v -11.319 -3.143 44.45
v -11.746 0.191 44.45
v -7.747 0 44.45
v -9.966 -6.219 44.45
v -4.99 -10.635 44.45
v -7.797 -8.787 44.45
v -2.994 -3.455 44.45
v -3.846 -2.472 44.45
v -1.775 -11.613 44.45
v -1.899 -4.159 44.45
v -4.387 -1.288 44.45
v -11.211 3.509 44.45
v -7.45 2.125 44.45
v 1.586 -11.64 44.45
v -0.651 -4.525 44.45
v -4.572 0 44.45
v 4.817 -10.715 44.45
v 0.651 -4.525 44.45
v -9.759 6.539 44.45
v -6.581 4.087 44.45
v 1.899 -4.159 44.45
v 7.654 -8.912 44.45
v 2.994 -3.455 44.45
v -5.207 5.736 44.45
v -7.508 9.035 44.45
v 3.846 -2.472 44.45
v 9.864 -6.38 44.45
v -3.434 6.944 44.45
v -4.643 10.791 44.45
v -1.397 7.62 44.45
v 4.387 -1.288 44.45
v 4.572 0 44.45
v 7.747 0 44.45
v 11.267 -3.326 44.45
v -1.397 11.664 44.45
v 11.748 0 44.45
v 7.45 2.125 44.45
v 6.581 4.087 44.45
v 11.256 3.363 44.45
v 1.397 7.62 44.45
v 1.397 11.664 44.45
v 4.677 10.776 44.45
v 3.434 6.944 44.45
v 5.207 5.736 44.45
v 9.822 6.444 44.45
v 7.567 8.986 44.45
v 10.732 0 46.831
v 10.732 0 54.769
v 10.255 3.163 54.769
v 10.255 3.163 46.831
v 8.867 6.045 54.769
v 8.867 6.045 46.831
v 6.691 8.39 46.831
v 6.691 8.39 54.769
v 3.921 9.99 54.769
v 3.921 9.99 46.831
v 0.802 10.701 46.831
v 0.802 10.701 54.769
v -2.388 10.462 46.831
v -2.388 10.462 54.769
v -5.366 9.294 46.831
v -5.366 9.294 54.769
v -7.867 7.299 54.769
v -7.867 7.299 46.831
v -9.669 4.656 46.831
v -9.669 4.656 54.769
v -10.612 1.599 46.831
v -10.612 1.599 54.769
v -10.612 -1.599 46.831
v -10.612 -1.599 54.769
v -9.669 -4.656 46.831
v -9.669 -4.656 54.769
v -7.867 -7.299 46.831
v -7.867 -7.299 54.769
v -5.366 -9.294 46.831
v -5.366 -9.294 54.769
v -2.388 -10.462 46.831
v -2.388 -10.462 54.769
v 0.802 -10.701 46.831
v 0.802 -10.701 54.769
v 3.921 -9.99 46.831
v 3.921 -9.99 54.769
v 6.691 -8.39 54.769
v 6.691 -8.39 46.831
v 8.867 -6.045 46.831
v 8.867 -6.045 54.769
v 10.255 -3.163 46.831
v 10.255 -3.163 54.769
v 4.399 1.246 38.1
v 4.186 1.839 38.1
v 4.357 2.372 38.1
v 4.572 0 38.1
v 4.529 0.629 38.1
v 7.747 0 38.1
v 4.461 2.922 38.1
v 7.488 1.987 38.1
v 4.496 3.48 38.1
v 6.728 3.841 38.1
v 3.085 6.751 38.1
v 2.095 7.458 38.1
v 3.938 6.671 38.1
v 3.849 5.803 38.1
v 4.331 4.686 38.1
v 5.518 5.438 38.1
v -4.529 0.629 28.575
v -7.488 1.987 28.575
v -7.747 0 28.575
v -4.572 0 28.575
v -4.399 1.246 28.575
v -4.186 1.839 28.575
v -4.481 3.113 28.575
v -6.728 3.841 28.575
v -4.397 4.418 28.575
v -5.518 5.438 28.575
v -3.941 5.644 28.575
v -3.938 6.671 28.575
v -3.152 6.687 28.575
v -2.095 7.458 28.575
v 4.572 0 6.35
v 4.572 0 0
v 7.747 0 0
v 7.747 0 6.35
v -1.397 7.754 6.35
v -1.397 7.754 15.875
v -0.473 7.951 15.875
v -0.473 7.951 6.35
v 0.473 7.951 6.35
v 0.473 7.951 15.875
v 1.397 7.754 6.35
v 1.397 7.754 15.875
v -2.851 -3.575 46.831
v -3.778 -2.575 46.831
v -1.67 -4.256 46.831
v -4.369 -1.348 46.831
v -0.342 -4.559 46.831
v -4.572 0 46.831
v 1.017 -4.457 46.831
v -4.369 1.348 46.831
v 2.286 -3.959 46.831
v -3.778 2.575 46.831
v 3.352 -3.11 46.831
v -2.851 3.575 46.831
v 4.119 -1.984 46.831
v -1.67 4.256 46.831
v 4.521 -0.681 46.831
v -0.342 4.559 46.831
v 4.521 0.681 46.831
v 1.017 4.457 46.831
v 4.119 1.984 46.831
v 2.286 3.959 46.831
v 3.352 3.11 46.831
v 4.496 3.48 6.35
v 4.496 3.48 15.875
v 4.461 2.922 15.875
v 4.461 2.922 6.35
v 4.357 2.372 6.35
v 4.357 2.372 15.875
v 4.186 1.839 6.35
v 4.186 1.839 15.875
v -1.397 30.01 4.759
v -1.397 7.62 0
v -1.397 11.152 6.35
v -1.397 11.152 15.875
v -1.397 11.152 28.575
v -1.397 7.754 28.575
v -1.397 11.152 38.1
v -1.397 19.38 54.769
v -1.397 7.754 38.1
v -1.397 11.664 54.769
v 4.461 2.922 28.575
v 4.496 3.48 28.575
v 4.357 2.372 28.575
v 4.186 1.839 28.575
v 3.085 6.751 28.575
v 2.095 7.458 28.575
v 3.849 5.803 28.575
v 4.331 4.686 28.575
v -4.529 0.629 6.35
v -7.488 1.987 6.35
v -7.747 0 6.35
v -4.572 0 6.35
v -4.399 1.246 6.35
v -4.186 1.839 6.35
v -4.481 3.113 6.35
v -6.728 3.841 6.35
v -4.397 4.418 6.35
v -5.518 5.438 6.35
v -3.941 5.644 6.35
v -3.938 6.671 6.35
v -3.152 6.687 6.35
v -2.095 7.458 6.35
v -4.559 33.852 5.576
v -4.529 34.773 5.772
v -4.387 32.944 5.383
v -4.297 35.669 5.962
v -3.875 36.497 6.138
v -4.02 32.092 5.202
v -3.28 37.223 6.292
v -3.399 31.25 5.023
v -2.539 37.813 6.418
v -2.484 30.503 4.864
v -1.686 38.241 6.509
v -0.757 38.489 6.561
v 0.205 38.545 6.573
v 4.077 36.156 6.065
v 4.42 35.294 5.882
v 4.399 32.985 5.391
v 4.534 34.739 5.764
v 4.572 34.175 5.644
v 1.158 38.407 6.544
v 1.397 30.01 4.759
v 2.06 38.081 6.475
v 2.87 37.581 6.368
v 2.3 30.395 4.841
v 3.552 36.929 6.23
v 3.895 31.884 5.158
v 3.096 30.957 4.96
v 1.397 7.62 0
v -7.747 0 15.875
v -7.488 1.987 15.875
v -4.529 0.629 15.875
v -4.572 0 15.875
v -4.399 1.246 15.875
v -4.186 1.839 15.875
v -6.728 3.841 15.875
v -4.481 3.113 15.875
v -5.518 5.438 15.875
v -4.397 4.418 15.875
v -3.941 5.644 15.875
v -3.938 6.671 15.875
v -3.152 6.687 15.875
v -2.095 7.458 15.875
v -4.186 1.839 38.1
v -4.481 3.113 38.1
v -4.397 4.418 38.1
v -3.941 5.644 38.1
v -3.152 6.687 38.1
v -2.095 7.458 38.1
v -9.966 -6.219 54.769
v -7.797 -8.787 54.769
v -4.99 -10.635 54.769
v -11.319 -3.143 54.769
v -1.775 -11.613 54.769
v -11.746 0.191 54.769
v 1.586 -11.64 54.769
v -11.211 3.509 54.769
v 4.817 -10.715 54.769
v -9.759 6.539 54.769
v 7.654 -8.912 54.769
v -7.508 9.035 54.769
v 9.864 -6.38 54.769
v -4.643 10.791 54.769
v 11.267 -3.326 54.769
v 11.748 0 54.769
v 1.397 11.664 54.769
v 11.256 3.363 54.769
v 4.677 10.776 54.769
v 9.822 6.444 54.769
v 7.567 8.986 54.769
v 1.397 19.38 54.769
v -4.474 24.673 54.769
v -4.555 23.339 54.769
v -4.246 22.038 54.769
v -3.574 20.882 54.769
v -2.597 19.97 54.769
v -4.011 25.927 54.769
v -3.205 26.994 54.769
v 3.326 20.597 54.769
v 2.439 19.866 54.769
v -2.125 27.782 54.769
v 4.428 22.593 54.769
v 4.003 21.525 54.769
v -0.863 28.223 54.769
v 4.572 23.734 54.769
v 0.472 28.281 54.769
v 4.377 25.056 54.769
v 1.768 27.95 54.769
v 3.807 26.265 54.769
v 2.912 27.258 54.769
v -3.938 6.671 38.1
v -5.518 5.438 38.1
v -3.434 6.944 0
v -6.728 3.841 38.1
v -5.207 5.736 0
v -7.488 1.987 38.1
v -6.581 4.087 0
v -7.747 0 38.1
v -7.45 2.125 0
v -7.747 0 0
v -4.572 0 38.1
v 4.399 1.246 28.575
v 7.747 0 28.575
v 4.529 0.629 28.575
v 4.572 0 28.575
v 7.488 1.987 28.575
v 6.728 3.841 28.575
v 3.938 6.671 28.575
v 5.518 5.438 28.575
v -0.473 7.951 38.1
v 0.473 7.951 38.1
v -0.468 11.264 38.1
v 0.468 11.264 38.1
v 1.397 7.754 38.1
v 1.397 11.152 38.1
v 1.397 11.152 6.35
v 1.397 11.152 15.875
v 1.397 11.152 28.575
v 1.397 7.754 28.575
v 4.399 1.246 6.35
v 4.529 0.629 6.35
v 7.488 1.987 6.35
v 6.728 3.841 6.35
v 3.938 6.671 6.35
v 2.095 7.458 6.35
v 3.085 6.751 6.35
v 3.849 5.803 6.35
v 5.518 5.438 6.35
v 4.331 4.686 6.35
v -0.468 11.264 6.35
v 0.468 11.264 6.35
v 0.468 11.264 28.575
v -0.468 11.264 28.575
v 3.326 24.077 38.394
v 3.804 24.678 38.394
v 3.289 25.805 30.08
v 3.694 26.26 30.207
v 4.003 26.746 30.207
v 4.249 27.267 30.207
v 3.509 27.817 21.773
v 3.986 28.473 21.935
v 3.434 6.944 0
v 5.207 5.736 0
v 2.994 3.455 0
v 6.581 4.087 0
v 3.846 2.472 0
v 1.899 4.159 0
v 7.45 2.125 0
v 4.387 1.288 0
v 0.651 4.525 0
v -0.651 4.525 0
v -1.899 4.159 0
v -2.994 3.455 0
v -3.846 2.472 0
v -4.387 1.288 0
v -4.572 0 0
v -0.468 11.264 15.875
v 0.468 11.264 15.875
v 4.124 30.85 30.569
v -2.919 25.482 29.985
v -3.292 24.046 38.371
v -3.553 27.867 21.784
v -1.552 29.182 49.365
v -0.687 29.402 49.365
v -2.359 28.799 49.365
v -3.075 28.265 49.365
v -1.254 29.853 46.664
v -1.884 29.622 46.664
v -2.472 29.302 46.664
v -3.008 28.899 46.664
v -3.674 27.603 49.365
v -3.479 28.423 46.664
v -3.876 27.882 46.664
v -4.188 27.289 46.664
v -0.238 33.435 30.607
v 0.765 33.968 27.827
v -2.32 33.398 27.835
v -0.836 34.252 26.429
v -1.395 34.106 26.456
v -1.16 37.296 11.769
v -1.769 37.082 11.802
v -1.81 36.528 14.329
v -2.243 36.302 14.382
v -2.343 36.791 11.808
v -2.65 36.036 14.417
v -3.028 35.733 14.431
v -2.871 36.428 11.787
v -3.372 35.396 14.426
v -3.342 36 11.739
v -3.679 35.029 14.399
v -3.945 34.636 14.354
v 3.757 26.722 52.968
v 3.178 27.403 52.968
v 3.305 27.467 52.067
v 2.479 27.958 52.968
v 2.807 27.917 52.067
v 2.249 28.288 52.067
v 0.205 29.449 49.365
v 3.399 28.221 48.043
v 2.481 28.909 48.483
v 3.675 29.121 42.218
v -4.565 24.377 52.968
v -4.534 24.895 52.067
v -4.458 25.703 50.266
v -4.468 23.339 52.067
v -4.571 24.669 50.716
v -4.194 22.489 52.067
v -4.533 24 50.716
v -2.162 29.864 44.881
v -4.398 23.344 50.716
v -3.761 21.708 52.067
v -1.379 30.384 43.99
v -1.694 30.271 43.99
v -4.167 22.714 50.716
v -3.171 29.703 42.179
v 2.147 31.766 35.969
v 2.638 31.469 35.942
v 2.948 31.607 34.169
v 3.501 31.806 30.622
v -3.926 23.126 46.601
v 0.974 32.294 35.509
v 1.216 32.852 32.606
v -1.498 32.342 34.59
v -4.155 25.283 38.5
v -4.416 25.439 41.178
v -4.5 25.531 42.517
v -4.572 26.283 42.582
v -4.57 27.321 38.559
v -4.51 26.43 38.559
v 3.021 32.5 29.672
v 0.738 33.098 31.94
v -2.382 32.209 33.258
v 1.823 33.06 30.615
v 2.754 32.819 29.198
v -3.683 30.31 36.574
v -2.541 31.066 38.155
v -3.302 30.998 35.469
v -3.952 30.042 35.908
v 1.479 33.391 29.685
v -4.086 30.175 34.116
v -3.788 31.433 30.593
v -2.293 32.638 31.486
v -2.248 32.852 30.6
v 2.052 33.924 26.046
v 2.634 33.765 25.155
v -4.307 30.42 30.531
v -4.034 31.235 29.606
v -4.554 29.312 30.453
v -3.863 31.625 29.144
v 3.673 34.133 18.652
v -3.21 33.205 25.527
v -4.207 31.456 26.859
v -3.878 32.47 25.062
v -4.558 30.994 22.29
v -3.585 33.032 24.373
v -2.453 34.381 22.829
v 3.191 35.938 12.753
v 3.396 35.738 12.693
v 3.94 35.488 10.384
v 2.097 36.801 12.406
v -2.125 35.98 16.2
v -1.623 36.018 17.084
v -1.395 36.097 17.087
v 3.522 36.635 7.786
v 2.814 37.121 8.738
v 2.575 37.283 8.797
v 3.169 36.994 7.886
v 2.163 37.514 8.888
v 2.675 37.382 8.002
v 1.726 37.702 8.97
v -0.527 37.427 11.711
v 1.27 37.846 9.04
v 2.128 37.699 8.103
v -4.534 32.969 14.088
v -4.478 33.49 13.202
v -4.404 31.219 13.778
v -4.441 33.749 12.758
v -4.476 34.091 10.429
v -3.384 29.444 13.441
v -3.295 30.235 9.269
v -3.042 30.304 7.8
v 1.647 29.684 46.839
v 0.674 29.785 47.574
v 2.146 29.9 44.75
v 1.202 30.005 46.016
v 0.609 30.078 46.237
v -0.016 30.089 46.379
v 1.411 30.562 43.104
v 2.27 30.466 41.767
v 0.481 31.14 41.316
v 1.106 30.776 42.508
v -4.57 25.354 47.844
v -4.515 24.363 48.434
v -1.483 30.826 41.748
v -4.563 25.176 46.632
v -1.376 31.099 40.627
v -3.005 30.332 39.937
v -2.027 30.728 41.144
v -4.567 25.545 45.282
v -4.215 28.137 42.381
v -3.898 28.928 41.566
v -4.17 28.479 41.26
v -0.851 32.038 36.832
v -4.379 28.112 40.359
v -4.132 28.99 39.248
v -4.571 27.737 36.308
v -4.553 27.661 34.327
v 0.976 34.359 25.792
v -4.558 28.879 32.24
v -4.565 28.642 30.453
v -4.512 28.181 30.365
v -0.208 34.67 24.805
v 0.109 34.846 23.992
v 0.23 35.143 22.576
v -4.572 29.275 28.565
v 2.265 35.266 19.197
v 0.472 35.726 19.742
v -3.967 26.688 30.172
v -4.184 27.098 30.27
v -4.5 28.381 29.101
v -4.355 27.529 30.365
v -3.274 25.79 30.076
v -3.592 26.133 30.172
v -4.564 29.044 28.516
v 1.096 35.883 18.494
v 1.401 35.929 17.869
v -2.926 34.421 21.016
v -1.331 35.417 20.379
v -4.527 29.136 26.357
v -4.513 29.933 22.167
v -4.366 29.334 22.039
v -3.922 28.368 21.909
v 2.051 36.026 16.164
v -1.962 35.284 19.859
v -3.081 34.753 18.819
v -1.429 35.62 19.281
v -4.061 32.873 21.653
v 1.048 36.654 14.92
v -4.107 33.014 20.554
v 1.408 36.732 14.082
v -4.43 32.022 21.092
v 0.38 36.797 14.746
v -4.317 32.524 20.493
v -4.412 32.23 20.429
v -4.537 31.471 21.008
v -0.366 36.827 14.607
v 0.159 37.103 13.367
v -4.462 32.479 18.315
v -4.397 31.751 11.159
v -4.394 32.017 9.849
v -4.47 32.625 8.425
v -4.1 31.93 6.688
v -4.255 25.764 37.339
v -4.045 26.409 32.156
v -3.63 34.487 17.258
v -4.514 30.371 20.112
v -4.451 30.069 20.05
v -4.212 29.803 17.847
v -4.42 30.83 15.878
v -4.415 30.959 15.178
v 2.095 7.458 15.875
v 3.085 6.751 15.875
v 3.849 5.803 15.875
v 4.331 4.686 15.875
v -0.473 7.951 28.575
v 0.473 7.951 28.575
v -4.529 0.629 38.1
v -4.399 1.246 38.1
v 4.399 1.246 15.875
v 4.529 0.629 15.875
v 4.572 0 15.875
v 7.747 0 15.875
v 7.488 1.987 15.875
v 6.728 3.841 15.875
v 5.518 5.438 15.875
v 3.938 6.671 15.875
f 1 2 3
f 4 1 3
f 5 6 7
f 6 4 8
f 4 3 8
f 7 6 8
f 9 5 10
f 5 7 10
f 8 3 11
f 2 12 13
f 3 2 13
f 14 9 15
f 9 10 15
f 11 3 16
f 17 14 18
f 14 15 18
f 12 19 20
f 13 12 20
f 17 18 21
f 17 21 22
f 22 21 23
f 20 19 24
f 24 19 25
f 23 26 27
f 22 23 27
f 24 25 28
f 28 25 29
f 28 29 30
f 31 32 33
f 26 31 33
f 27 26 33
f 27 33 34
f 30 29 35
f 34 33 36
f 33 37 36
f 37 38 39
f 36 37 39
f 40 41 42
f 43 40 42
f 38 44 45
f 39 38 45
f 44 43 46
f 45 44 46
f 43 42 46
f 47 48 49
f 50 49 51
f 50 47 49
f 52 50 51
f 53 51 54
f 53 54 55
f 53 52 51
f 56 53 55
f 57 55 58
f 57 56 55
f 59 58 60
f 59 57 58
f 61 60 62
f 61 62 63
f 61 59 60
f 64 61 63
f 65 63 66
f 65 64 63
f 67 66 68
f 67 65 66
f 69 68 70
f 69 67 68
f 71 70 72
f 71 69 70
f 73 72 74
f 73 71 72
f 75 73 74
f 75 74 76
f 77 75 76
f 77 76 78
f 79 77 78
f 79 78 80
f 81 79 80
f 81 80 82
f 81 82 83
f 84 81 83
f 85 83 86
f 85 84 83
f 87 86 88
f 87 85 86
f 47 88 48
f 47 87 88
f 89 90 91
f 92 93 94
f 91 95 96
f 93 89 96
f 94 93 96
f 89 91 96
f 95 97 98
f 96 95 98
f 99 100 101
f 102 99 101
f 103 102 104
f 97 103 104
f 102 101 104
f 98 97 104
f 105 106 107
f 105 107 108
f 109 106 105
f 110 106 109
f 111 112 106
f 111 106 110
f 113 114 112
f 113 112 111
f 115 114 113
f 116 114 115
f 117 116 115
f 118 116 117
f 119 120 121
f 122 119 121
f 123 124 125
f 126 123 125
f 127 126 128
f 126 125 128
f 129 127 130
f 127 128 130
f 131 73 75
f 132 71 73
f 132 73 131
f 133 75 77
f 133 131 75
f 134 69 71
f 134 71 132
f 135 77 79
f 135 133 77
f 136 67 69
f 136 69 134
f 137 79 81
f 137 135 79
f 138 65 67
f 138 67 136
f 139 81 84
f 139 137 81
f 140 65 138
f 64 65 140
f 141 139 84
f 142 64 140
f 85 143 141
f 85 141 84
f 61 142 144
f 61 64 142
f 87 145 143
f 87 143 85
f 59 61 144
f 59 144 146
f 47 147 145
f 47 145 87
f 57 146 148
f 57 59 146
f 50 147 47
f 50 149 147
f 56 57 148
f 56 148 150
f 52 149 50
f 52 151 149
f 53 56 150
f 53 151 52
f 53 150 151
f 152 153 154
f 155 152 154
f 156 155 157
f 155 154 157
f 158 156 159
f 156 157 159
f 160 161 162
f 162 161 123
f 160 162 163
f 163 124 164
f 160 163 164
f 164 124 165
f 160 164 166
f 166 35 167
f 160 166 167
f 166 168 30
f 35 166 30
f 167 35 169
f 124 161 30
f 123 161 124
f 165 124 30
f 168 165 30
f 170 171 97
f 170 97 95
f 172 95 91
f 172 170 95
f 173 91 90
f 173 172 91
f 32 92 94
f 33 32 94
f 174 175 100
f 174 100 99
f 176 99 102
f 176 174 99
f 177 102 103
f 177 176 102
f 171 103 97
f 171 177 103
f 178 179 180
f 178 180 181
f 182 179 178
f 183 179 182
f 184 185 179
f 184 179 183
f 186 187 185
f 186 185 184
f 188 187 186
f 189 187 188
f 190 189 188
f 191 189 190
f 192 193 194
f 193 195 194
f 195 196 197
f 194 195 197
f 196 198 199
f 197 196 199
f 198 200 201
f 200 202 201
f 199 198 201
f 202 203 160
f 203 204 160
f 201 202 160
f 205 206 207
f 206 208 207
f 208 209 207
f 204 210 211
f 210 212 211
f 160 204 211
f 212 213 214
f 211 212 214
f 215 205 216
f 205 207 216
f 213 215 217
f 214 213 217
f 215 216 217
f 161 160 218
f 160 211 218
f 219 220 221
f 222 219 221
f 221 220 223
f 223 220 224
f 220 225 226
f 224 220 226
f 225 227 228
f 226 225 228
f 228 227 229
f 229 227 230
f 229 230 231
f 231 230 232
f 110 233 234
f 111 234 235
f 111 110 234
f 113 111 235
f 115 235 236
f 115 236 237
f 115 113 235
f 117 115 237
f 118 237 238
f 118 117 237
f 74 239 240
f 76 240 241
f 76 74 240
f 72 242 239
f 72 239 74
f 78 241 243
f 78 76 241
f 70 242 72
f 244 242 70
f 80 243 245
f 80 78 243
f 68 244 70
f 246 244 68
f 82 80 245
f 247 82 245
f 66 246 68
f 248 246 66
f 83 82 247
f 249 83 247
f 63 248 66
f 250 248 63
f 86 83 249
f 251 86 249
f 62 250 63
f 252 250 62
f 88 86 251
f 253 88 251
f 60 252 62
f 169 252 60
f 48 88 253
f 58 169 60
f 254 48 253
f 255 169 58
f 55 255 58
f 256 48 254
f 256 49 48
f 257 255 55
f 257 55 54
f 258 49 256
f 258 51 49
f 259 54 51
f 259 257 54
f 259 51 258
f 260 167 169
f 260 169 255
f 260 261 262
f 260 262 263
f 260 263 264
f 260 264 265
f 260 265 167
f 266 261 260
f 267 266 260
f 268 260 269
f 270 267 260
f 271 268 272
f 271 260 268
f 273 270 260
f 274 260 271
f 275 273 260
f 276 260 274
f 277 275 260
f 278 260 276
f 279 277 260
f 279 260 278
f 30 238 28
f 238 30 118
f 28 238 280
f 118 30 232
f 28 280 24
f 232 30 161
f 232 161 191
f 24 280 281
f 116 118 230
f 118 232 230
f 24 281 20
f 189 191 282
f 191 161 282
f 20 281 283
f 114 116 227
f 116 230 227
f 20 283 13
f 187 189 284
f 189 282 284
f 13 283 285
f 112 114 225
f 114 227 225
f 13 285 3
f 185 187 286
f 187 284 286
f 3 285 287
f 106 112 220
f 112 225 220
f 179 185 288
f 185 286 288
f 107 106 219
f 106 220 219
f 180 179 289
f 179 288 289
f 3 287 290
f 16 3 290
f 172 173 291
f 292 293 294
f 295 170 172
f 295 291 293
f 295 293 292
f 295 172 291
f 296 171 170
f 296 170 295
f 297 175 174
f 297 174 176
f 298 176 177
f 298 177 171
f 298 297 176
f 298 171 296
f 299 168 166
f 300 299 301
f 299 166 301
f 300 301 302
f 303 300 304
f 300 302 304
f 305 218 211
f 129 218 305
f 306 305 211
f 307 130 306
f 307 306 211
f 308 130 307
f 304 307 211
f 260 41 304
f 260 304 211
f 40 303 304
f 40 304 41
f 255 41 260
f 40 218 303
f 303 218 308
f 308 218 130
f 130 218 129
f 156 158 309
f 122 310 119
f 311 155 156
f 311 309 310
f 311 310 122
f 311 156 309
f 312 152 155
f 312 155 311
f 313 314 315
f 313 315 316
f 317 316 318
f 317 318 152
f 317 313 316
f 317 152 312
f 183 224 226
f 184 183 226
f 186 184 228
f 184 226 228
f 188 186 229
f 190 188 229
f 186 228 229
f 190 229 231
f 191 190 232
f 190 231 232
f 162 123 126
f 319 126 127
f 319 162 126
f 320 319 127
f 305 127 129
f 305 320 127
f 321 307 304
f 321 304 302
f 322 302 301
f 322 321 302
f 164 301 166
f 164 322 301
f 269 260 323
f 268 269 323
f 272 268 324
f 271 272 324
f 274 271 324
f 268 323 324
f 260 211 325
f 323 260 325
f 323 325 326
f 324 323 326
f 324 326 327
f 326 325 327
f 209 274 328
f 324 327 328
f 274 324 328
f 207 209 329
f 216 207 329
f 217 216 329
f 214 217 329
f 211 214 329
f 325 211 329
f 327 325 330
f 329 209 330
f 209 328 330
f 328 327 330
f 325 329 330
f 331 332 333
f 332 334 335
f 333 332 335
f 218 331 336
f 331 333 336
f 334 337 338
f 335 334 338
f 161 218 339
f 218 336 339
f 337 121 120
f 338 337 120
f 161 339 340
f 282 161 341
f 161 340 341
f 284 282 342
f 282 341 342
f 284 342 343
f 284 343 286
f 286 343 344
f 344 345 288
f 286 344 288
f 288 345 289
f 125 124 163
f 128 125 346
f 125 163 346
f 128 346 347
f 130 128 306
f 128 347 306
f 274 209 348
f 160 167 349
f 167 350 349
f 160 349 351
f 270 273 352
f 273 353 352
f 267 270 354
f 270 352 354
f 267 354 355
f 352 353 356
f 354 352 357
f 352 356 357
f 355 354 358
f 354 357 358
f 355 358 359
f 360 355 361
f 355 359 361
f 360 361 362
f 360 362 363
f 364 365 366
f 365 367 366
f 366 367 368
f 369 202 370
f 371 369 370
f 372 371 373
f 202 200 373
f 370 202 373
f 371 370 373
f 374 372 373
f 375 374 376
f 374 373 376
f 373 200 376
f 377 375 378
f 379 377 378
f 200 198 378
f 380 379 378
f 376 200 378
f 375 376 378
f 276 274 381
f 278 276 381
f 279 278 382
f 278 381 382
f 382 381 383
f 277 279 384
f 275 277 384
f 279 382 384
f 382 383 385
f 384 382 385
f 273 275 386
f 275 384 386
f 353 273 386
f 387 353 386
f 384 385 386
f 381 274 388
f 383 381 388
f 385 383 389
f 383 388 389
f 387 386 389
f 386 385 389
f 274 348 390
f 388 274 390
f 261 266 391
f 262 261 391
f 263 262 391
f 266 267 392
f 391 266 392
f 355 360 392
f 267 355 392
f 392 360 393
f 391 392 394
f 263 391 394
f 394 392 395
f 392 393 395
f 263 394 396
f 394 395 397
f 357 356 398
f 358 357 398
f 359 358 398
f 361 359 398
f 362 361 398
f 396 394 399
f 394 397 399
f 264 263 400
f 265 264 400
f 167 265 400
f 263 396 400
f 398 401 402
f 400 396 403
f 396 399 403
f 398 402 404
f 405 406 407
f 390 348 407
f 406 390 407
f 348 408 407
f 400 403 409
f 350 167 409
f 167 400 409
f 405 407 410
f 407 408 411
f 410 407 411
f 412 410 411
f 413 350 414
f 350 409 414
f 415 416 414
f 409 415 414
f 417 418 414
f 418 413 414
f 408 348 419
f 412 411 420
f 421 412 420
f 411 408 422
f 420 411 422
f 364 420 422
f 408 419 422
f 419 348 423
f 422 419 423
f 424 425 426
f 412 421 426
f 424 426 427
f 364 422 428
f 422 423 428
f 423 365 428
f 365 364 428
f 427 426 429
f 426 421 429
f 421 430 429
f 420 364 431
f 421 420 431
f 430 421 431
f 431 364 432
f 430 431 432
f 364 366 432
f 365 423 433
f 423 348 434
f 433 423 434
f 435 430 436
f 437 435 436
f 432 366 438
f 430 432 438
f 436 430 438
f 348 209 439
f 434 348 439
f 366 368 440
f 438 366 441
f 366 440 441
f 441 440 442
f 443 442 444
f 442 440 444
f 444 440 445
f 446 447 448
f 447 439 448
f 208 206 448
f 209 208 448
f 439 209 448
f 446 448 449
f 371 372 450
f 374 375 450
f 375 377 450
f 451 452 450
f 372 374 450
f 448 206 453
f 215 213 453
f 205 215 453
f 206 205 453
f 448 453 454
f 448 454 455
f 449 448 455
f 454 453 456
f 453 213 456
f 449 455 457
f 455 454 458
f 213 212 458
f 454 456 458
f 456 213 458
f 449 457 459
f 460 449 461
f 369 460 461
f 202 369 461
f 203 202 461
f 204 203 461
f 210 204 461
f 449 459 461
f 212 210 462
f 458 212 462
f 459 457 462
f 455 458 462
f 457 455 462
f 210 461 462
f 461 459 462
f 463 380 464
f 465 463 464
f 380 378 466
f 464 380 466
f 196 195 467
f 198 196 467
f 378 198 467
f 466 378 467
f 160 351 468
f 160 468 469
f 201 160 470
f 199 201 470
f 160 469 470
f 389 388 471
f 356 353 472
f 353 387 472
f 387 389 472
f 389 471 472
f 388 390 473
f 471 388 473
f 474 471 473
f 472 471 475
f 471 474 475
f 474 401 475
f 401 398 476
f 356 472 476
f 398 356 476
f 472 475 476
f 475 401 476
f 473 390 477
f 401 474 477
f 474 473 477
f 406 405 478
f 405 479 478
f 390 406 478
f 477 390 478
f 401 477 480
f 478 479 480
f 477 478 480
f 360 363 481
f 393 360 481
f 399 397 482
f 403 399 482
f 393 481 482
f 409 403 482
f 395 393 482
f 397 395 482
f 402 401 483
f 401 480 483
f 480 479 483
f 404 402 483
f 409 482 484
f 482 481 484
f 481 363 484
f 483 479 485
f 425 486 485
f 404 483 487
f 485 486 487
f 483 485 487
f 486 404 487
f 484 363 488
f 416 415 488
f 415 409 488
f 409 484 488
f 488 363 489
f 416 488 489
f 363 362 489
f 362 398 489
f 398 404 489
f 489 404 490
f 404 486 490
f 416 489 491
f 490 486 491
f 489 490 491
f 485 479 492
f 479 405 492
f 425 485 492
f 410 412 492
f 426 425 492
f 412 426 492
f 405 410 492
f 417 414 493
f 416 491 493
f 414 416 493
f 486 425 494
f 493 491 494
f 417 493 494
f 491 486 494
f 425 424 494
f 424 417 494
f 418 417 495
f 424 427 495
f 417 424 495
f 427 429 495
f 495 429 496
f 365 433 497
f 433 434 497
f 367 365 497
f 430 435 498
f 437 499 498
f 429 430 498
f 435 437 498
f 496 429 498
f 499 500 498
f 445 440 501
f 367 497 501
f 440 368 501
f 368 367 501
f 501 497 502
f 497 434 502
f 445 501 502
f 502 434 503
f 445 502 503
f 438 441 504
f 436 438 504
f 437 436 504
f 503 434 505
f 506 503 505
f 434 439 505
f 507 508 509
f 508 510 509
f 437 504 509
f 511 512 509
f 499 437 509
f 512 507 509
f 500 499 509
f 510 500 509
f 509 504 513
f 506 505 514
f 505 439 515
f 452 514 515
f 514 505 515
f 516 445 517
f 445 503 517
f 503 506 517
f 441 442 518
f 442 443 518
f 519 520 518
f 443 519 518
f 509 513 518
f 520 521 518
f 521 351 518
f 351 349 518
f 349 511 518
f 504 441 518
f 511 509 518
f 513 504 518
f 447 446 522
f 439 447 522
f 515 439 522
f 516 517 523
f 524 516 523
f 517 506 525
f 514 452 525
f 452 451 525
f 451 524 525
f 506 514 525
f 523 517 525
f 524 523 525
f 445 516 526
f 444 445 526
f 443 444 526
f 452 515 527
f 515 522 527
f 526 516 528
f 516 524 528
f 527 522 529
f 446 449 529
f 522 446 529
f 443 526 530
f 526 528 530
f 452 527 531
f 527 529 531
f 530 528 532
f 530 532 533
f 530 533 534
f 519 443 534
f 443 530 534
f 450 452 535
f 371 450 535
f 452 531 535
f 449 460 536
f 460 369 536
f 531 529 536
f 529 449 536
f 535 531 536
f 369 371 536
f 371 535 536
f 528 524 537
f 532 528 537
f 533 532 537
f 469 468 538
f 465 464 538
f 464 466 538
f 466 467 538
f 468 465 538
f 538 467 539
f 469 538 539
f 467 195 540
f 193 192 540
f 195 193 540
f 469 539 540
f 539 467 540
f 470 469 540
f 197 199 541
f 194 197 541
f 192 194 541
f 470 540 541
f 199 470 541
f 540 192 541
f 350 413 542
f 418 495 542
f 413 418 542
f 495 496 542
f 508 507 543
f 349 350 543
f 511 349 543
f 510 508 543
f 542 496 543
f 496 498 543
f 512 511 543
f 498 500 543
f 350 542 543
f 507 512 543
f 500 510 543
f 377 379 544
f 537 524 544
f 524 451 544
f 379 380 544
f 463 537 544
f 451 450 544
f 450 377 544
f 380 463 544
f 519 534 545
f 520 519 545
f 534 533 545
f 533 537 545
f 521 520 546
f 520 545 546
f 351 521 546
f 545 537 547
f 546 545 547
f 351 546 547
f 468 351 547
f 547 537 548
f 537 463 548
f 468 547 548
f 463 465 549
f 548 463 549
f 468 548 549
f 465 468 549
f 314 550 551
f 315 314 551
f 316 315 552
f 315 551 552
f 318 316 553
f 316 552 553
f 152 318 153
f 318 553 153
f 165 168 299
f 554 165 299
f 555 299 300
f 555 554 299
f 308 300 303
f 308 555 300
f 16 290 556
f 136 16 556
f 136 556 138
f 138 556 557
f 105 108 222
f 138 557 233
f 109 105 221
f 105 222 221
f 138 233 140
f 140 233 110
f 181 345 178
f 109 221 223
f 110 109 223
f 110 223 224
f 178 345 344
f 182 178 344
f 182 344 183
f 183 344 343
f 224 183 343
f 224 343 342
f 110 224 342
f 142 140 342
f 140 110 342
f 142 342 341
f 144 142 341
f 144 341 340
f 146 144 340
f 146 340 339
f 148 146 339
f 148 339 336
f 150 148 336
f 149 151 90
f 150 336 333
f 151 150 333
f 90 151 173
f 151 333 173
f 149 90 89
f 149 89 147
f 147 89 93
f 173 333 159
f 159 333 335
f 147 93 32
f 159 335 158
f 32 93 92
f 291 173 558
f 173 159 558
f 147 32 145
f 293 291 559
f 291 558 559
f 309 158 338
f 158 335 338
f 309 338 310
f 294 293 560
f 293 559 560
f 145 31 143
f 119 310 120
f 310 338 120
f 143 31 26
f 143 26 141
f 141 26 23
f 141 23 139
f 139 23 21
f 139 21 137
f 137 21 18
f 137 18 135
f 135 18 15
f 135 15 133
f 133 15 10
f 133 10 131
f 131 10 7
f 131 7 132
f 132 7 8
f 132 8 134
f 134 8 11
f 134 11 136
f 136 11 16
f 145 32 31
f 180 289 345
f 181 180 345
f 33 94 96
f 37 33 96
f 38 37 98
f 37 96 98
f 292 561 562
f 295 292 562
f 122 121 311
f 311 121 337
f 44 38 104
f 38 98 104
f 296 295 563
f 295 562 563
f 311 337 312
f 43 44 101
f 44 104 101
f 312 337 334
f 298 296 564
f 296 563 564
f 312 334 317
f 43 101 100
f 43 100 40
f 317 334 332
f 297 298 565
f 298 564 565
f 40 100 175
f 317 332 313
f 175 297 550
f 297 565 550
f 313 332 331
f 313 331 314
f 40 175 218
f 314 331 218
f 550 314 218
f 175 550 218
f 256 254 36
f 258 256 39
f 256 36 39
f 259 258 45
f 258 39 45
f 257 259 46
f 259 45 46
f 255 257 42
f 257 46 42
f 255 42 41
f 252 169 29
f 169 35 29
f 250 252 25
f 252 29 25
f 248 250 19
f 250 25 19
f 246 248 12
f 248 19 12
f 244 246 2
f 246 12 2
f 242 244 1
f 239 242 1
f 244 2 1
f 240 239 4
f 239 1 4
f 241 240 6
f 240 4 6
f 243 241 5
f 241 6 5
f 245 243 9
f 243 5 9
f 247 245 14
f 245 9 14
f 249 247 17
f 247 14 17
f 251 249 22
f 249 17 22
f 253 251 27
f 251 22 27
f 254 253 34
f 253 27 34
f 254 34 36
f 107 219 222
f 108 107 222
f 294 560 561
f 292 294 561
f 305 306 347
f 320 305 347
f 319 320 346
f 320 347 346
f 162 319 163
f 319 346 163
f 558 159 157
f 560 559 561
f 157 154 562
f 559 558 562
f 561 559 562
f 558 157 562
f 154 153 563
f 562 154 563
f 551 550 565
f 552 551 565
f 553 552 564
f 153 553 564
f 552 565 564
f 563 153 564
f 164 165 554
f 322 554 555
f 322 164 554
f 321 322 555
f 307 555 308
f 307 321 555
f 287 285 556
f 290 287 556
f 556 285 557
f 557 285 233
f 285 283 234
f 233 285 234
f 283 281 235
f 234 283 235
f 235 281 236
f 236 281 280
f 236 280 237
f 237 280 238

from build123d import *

# Parameters (mm, degrees)
F1_DEPTH    = 44.45
F9_DEPTH    = 9.525
F10_DEPTH   = 9.525
F12_DEPTH   = 2.38125
F13_R       = 11.7475
F13_R_2     = 10.7315
F14_DEPTH   = 7.9375
F15_DEPTH   = 10.31875
F15_FACE1_W = 2.794
F15_FACE1_H = 54.76875
F22_DEPTH   = 12.7


with BuildPart() as f1:
    # F0 (on Top) → F1 (new body)
    with BuildSketch(Plane.XY):
        with BuildLine():
            ThreePointArc((-4.572, 0), (0, 4.572), (4.572, 0))
            Line((4.572, 0), (7.747, 0))
            ThreePointArc((7.747, 0), (5.951410253, 4.9595085442), (1.397, 7.62))
            ThreePointArc((1.397, 7.62), (0, 7.747), (-1.397, 7.62))
            ThreePointArc((-1.397, 7.62), (-5.951410253, 4.9595085442), (-7.747, 0))
            Line((-7.747, 0), (-4.572, 0))
        make_face()
        with BuildLine():
            ThreePointArc((-1.397, 7.62), (0, 7.747), (1.397, 7.62))
            Line((1.397, 7.62), (1.397, 19.3802))
            Line((1.397, 19.3802), (-1.397, 19.3802))
            Line((-1.397, 19.3802), (-1.397, 7.62))
        make_face()
    extrude(amount=F1_DEPTH)

    # F6 (on offset) → F9 (cut)
    with BuildSketch(Plane.XY.offset(28.575)):
        with BuildLine():
            ThreePointArc((4.1557772601, 1.7640375299), (0, -1.016), (-4.1557772601, 1.7640375299))
            Line((-4.1557772601, 1.7640375299), (-7.6070004234, 1.7640375299))
            ThreePointArc((-7.6070004234, 1.7640375299), (0, -4.318), (7.6070004234, 1.7640375299))
            Line((7.6070004234, 1.7640375299), (4.1557772601, 1.7640375299))
        make_face()
        with BuildLine():
            ThreePointArc((-4.1557772601, 1.7640375299), (-0.8747878771, 7.8904367738), (4.4961791045, 3.4801791045))
            ThreePointArc((4.4961791045, 3.4801791045), (4.4102576693, 2.6053912274), (4.1557772601, 1.7640375299))
            Line((4.1557772601, 1.7640375299), (7.6070004234, 1.7640375299))
            ThreePointArc((7.6070004234, 1.7640375299), (7.750237064, 2.6168003938), (7.7981791045, 3.4801791045))
            ThreePointArc((7.7981791045, 3.4801791045), (-0.8633787106, 11.2304161684), (-7.6070004234, 1.7640375299))
            Line((-7.6070004234, 1.7640375299), (-4.1557772601, 1.7640375299))
        make_face()
        with BuildLine():
            ThreePointArc((7.6070004234, 1.7640375299), (0, -4.318), (-7.6070004234, 1.7640375299))
            Line((-7.6070004234, 1.7640375299), (-8.4216929972, 1.7640375299))
            Line((-8.4216929972, 1.7640375299), (-8.4216929972, -6.3198274001))
            Line((-8.4216929972, -6.3198274001), (11.7628639564, -6.3198274001))
            Line((11.7628639564, -6.3198274001), (11.7628639564, 1.7640375299))
            Line((11.7628639564, 1.7640375299), (7.6070004234, 1.7640375299))
        make_face()
    extrude(amount=F9_DEPTH, mode=Mode.SUBTRACT)

    # F8 (on offset) → F10 (cut)
    with BuildSketch(Plane.XY.offset(15.875)):
        with BuildLine():
            ThreePointArc((4.179462045, 1.8225532258), (0, -1.016), (-4.179462045, 1.8225532258))
            Line((-4.179462045, 1.8225532258), (-7.6199654718, 1.8225532258))
            ThreePointArc((-7.6199654718, 1.8225532258), (0, -4.318), (7.6199654718, 1.8225532258))
            Line((7.6199654718, 1.8225532258), (4.179462045, 1.8225532258))
        make_face()
        with BuildLine():
            ThreePointArc((-4.179462045, 1.8225532258), (-0.8438058499, 7.8964692022), (4.4961791045, 3.4801791045))
            ThreePointArc((4.4961791045, 3.4801791045), (4.4162900977, 2.6363732546), (4.179462045, 1.8225532258))
            Line((4.179462045, 1.8225532258), (7.6199654718, 1.8225532258))
            ThreePointArc((7.6199654718, 1.8225532258), (7.7534976902, 2.6465899292), (7.7981791045, 3.4801791045))
            ThreePointArc((7.7981791045, 3.4801791045), (-0.8335891753, 11.2336767947), (-7.6199654718, 1.8225532258))
            Line((-7.6199654718, 1.8225532258), (-4.179462045, 1.8225532258))
        make_face()
        with BuildLine():
            ThreePointArc((7.6199654718, 1.8225532258), (0, -4.318), (-7.6199654718, 1.8225532258))
            Line((-7.6199654718, 1.8225532258), (-8.5849482566, 1.8225532258))
            Line((-8.5849482566, 1.8225532258), (-8.5849482566, -5.9901881032))
            Line((-8.5849482566, -5.9901881032), (8.4006469697, -5.9901881032))
            Line((8.4006469697, -5.9901881032), (8.4006469697, 1.8225532258))
            Line((8.4006469697, 1.8225532258), (7.6199654718, 1.8225532258))
        make_face()
    extrude(amount=-F10_DEPTH, mode=Mode.SUBTRACT)

    # F11 (on face) → F12 (join)
    with BuildSketch(Plane.XY.offset(44.45)):
        with BuildLine():
            ThreePointArc((-1.397, 11.6641393703), (-7.7971949684, -8.7867802337), (11.7475, 0))
            ThreePointArc((11.7475, 0), (8.7867802337, 7.7971949684), (1.397, 11.6641393703))
            Line((1.397, 11.6641393703), (1.397, 7.62))
            ThreePointArc((1.397, 7.62), (5.951410253, 4.9595085442), (7.747, 0))
            Line((7.747, 0), (4.572, 0))
            ThreePointArc((4.572, 0), (0, -4.572), (-4.572, 0))
            Line((-4.572, 0), (-7.747, 0))
            ThreePointArc((-7.747, 0), (-5.951410253, 4.9595085442), (-1.397, 7.62))
            Line((-1.397, 7.62), (-1.397, 11.6641393703))
        make_face()
        with BuildLine():
            Line((1.397, 7.62), (1.397, 11.6641393703))
            ThreePointArc((1.397, 11.6641393703), (0, 11.7475), (-1.397, 11.6641393703))
            Line((-1.397, 11.6641393703), (-1.397, 7.62))
            ThreePointArc((-1.397, 7.62), (-5.951410253, 4.9595085442), (-7.747, 0))
            Line((-7.747, 0), (-4.572, 0))
            ThreePointArc((-4.572, 0), (0, 4.572), (4.572, 0))
            Line((4.572, 0), (7.747, 0))
            ThreePointArc((7.747, 0), (5.951410253, 4.9595085442), (1.397, 7.62))
        make_face()
    extrude(amount=F12_DEPTH)

    # F13 (on face) → F14 (join)
    with BuildSketch(Plane.XY.offset(46.83125)):
        Circle(F13_R)
        Circle(F13_R_2, mode=Mode.SUBTRACT)
    extrude(amount=F14_DEPTH)

    # F15 (add, through all): a face of the model
    f15_faces = [f1.faces().sort_by_distance(p)[0] for p in [
        (0, 15.5499360639, 44.45),
    ]]
    extrude(f15_faces, amount=F15_DEPTH)

    # F18: sweep along a path in F17
    with BuildLine(Plane.YZ) as f18_path:
        Line((23.7335406713, 54.76875), (35.3749978582, 0))
    # F16 (on face) → F18 (sweep)
    with BuildSketch(Plane.XY.offset(54.76875)):
        with BuildLine():
            ThreePointArc((1.397, 19.3802), (3.6939320514, 21.0394638349), (4.572, 23.7335406713))
            ThreePointArc((4.572, 23.7335406713), (-2.6940768363, 27.4274727226), (-1.397, 19.3802))
            Line((-1.397, 19.3802), (1.397, 19.3802))
        make_face()
    sweep(path=f18_path.line)

    # F15_face1 (on face) → F19 (join, up to the next surface of F1)
    with BuildSketch(Plane(origin=(0, 19.3802, 27.384375), x_dir=(-1, 0, 0), z_dir=(0, 1, 0))):
        Rectangle(F15_FACE1_W, F15_FACE1_H)
    extrude(until=Until.NEXT)

    # F20: union 

    # F21 (on Right) → F22 (cut, symmetric)
    with BuildSketch(Plane.YZ):
        Polygon((39.6406120252, 6.8061911946), (7.62, 0), (8.2477421489, -2.2532611279), (41.5662580615, -2.2532611279), align=None)
    extrude(amount=F22_DEPTH, both=True, mode=Mode.SUBTRACT)


solid = f1.part
